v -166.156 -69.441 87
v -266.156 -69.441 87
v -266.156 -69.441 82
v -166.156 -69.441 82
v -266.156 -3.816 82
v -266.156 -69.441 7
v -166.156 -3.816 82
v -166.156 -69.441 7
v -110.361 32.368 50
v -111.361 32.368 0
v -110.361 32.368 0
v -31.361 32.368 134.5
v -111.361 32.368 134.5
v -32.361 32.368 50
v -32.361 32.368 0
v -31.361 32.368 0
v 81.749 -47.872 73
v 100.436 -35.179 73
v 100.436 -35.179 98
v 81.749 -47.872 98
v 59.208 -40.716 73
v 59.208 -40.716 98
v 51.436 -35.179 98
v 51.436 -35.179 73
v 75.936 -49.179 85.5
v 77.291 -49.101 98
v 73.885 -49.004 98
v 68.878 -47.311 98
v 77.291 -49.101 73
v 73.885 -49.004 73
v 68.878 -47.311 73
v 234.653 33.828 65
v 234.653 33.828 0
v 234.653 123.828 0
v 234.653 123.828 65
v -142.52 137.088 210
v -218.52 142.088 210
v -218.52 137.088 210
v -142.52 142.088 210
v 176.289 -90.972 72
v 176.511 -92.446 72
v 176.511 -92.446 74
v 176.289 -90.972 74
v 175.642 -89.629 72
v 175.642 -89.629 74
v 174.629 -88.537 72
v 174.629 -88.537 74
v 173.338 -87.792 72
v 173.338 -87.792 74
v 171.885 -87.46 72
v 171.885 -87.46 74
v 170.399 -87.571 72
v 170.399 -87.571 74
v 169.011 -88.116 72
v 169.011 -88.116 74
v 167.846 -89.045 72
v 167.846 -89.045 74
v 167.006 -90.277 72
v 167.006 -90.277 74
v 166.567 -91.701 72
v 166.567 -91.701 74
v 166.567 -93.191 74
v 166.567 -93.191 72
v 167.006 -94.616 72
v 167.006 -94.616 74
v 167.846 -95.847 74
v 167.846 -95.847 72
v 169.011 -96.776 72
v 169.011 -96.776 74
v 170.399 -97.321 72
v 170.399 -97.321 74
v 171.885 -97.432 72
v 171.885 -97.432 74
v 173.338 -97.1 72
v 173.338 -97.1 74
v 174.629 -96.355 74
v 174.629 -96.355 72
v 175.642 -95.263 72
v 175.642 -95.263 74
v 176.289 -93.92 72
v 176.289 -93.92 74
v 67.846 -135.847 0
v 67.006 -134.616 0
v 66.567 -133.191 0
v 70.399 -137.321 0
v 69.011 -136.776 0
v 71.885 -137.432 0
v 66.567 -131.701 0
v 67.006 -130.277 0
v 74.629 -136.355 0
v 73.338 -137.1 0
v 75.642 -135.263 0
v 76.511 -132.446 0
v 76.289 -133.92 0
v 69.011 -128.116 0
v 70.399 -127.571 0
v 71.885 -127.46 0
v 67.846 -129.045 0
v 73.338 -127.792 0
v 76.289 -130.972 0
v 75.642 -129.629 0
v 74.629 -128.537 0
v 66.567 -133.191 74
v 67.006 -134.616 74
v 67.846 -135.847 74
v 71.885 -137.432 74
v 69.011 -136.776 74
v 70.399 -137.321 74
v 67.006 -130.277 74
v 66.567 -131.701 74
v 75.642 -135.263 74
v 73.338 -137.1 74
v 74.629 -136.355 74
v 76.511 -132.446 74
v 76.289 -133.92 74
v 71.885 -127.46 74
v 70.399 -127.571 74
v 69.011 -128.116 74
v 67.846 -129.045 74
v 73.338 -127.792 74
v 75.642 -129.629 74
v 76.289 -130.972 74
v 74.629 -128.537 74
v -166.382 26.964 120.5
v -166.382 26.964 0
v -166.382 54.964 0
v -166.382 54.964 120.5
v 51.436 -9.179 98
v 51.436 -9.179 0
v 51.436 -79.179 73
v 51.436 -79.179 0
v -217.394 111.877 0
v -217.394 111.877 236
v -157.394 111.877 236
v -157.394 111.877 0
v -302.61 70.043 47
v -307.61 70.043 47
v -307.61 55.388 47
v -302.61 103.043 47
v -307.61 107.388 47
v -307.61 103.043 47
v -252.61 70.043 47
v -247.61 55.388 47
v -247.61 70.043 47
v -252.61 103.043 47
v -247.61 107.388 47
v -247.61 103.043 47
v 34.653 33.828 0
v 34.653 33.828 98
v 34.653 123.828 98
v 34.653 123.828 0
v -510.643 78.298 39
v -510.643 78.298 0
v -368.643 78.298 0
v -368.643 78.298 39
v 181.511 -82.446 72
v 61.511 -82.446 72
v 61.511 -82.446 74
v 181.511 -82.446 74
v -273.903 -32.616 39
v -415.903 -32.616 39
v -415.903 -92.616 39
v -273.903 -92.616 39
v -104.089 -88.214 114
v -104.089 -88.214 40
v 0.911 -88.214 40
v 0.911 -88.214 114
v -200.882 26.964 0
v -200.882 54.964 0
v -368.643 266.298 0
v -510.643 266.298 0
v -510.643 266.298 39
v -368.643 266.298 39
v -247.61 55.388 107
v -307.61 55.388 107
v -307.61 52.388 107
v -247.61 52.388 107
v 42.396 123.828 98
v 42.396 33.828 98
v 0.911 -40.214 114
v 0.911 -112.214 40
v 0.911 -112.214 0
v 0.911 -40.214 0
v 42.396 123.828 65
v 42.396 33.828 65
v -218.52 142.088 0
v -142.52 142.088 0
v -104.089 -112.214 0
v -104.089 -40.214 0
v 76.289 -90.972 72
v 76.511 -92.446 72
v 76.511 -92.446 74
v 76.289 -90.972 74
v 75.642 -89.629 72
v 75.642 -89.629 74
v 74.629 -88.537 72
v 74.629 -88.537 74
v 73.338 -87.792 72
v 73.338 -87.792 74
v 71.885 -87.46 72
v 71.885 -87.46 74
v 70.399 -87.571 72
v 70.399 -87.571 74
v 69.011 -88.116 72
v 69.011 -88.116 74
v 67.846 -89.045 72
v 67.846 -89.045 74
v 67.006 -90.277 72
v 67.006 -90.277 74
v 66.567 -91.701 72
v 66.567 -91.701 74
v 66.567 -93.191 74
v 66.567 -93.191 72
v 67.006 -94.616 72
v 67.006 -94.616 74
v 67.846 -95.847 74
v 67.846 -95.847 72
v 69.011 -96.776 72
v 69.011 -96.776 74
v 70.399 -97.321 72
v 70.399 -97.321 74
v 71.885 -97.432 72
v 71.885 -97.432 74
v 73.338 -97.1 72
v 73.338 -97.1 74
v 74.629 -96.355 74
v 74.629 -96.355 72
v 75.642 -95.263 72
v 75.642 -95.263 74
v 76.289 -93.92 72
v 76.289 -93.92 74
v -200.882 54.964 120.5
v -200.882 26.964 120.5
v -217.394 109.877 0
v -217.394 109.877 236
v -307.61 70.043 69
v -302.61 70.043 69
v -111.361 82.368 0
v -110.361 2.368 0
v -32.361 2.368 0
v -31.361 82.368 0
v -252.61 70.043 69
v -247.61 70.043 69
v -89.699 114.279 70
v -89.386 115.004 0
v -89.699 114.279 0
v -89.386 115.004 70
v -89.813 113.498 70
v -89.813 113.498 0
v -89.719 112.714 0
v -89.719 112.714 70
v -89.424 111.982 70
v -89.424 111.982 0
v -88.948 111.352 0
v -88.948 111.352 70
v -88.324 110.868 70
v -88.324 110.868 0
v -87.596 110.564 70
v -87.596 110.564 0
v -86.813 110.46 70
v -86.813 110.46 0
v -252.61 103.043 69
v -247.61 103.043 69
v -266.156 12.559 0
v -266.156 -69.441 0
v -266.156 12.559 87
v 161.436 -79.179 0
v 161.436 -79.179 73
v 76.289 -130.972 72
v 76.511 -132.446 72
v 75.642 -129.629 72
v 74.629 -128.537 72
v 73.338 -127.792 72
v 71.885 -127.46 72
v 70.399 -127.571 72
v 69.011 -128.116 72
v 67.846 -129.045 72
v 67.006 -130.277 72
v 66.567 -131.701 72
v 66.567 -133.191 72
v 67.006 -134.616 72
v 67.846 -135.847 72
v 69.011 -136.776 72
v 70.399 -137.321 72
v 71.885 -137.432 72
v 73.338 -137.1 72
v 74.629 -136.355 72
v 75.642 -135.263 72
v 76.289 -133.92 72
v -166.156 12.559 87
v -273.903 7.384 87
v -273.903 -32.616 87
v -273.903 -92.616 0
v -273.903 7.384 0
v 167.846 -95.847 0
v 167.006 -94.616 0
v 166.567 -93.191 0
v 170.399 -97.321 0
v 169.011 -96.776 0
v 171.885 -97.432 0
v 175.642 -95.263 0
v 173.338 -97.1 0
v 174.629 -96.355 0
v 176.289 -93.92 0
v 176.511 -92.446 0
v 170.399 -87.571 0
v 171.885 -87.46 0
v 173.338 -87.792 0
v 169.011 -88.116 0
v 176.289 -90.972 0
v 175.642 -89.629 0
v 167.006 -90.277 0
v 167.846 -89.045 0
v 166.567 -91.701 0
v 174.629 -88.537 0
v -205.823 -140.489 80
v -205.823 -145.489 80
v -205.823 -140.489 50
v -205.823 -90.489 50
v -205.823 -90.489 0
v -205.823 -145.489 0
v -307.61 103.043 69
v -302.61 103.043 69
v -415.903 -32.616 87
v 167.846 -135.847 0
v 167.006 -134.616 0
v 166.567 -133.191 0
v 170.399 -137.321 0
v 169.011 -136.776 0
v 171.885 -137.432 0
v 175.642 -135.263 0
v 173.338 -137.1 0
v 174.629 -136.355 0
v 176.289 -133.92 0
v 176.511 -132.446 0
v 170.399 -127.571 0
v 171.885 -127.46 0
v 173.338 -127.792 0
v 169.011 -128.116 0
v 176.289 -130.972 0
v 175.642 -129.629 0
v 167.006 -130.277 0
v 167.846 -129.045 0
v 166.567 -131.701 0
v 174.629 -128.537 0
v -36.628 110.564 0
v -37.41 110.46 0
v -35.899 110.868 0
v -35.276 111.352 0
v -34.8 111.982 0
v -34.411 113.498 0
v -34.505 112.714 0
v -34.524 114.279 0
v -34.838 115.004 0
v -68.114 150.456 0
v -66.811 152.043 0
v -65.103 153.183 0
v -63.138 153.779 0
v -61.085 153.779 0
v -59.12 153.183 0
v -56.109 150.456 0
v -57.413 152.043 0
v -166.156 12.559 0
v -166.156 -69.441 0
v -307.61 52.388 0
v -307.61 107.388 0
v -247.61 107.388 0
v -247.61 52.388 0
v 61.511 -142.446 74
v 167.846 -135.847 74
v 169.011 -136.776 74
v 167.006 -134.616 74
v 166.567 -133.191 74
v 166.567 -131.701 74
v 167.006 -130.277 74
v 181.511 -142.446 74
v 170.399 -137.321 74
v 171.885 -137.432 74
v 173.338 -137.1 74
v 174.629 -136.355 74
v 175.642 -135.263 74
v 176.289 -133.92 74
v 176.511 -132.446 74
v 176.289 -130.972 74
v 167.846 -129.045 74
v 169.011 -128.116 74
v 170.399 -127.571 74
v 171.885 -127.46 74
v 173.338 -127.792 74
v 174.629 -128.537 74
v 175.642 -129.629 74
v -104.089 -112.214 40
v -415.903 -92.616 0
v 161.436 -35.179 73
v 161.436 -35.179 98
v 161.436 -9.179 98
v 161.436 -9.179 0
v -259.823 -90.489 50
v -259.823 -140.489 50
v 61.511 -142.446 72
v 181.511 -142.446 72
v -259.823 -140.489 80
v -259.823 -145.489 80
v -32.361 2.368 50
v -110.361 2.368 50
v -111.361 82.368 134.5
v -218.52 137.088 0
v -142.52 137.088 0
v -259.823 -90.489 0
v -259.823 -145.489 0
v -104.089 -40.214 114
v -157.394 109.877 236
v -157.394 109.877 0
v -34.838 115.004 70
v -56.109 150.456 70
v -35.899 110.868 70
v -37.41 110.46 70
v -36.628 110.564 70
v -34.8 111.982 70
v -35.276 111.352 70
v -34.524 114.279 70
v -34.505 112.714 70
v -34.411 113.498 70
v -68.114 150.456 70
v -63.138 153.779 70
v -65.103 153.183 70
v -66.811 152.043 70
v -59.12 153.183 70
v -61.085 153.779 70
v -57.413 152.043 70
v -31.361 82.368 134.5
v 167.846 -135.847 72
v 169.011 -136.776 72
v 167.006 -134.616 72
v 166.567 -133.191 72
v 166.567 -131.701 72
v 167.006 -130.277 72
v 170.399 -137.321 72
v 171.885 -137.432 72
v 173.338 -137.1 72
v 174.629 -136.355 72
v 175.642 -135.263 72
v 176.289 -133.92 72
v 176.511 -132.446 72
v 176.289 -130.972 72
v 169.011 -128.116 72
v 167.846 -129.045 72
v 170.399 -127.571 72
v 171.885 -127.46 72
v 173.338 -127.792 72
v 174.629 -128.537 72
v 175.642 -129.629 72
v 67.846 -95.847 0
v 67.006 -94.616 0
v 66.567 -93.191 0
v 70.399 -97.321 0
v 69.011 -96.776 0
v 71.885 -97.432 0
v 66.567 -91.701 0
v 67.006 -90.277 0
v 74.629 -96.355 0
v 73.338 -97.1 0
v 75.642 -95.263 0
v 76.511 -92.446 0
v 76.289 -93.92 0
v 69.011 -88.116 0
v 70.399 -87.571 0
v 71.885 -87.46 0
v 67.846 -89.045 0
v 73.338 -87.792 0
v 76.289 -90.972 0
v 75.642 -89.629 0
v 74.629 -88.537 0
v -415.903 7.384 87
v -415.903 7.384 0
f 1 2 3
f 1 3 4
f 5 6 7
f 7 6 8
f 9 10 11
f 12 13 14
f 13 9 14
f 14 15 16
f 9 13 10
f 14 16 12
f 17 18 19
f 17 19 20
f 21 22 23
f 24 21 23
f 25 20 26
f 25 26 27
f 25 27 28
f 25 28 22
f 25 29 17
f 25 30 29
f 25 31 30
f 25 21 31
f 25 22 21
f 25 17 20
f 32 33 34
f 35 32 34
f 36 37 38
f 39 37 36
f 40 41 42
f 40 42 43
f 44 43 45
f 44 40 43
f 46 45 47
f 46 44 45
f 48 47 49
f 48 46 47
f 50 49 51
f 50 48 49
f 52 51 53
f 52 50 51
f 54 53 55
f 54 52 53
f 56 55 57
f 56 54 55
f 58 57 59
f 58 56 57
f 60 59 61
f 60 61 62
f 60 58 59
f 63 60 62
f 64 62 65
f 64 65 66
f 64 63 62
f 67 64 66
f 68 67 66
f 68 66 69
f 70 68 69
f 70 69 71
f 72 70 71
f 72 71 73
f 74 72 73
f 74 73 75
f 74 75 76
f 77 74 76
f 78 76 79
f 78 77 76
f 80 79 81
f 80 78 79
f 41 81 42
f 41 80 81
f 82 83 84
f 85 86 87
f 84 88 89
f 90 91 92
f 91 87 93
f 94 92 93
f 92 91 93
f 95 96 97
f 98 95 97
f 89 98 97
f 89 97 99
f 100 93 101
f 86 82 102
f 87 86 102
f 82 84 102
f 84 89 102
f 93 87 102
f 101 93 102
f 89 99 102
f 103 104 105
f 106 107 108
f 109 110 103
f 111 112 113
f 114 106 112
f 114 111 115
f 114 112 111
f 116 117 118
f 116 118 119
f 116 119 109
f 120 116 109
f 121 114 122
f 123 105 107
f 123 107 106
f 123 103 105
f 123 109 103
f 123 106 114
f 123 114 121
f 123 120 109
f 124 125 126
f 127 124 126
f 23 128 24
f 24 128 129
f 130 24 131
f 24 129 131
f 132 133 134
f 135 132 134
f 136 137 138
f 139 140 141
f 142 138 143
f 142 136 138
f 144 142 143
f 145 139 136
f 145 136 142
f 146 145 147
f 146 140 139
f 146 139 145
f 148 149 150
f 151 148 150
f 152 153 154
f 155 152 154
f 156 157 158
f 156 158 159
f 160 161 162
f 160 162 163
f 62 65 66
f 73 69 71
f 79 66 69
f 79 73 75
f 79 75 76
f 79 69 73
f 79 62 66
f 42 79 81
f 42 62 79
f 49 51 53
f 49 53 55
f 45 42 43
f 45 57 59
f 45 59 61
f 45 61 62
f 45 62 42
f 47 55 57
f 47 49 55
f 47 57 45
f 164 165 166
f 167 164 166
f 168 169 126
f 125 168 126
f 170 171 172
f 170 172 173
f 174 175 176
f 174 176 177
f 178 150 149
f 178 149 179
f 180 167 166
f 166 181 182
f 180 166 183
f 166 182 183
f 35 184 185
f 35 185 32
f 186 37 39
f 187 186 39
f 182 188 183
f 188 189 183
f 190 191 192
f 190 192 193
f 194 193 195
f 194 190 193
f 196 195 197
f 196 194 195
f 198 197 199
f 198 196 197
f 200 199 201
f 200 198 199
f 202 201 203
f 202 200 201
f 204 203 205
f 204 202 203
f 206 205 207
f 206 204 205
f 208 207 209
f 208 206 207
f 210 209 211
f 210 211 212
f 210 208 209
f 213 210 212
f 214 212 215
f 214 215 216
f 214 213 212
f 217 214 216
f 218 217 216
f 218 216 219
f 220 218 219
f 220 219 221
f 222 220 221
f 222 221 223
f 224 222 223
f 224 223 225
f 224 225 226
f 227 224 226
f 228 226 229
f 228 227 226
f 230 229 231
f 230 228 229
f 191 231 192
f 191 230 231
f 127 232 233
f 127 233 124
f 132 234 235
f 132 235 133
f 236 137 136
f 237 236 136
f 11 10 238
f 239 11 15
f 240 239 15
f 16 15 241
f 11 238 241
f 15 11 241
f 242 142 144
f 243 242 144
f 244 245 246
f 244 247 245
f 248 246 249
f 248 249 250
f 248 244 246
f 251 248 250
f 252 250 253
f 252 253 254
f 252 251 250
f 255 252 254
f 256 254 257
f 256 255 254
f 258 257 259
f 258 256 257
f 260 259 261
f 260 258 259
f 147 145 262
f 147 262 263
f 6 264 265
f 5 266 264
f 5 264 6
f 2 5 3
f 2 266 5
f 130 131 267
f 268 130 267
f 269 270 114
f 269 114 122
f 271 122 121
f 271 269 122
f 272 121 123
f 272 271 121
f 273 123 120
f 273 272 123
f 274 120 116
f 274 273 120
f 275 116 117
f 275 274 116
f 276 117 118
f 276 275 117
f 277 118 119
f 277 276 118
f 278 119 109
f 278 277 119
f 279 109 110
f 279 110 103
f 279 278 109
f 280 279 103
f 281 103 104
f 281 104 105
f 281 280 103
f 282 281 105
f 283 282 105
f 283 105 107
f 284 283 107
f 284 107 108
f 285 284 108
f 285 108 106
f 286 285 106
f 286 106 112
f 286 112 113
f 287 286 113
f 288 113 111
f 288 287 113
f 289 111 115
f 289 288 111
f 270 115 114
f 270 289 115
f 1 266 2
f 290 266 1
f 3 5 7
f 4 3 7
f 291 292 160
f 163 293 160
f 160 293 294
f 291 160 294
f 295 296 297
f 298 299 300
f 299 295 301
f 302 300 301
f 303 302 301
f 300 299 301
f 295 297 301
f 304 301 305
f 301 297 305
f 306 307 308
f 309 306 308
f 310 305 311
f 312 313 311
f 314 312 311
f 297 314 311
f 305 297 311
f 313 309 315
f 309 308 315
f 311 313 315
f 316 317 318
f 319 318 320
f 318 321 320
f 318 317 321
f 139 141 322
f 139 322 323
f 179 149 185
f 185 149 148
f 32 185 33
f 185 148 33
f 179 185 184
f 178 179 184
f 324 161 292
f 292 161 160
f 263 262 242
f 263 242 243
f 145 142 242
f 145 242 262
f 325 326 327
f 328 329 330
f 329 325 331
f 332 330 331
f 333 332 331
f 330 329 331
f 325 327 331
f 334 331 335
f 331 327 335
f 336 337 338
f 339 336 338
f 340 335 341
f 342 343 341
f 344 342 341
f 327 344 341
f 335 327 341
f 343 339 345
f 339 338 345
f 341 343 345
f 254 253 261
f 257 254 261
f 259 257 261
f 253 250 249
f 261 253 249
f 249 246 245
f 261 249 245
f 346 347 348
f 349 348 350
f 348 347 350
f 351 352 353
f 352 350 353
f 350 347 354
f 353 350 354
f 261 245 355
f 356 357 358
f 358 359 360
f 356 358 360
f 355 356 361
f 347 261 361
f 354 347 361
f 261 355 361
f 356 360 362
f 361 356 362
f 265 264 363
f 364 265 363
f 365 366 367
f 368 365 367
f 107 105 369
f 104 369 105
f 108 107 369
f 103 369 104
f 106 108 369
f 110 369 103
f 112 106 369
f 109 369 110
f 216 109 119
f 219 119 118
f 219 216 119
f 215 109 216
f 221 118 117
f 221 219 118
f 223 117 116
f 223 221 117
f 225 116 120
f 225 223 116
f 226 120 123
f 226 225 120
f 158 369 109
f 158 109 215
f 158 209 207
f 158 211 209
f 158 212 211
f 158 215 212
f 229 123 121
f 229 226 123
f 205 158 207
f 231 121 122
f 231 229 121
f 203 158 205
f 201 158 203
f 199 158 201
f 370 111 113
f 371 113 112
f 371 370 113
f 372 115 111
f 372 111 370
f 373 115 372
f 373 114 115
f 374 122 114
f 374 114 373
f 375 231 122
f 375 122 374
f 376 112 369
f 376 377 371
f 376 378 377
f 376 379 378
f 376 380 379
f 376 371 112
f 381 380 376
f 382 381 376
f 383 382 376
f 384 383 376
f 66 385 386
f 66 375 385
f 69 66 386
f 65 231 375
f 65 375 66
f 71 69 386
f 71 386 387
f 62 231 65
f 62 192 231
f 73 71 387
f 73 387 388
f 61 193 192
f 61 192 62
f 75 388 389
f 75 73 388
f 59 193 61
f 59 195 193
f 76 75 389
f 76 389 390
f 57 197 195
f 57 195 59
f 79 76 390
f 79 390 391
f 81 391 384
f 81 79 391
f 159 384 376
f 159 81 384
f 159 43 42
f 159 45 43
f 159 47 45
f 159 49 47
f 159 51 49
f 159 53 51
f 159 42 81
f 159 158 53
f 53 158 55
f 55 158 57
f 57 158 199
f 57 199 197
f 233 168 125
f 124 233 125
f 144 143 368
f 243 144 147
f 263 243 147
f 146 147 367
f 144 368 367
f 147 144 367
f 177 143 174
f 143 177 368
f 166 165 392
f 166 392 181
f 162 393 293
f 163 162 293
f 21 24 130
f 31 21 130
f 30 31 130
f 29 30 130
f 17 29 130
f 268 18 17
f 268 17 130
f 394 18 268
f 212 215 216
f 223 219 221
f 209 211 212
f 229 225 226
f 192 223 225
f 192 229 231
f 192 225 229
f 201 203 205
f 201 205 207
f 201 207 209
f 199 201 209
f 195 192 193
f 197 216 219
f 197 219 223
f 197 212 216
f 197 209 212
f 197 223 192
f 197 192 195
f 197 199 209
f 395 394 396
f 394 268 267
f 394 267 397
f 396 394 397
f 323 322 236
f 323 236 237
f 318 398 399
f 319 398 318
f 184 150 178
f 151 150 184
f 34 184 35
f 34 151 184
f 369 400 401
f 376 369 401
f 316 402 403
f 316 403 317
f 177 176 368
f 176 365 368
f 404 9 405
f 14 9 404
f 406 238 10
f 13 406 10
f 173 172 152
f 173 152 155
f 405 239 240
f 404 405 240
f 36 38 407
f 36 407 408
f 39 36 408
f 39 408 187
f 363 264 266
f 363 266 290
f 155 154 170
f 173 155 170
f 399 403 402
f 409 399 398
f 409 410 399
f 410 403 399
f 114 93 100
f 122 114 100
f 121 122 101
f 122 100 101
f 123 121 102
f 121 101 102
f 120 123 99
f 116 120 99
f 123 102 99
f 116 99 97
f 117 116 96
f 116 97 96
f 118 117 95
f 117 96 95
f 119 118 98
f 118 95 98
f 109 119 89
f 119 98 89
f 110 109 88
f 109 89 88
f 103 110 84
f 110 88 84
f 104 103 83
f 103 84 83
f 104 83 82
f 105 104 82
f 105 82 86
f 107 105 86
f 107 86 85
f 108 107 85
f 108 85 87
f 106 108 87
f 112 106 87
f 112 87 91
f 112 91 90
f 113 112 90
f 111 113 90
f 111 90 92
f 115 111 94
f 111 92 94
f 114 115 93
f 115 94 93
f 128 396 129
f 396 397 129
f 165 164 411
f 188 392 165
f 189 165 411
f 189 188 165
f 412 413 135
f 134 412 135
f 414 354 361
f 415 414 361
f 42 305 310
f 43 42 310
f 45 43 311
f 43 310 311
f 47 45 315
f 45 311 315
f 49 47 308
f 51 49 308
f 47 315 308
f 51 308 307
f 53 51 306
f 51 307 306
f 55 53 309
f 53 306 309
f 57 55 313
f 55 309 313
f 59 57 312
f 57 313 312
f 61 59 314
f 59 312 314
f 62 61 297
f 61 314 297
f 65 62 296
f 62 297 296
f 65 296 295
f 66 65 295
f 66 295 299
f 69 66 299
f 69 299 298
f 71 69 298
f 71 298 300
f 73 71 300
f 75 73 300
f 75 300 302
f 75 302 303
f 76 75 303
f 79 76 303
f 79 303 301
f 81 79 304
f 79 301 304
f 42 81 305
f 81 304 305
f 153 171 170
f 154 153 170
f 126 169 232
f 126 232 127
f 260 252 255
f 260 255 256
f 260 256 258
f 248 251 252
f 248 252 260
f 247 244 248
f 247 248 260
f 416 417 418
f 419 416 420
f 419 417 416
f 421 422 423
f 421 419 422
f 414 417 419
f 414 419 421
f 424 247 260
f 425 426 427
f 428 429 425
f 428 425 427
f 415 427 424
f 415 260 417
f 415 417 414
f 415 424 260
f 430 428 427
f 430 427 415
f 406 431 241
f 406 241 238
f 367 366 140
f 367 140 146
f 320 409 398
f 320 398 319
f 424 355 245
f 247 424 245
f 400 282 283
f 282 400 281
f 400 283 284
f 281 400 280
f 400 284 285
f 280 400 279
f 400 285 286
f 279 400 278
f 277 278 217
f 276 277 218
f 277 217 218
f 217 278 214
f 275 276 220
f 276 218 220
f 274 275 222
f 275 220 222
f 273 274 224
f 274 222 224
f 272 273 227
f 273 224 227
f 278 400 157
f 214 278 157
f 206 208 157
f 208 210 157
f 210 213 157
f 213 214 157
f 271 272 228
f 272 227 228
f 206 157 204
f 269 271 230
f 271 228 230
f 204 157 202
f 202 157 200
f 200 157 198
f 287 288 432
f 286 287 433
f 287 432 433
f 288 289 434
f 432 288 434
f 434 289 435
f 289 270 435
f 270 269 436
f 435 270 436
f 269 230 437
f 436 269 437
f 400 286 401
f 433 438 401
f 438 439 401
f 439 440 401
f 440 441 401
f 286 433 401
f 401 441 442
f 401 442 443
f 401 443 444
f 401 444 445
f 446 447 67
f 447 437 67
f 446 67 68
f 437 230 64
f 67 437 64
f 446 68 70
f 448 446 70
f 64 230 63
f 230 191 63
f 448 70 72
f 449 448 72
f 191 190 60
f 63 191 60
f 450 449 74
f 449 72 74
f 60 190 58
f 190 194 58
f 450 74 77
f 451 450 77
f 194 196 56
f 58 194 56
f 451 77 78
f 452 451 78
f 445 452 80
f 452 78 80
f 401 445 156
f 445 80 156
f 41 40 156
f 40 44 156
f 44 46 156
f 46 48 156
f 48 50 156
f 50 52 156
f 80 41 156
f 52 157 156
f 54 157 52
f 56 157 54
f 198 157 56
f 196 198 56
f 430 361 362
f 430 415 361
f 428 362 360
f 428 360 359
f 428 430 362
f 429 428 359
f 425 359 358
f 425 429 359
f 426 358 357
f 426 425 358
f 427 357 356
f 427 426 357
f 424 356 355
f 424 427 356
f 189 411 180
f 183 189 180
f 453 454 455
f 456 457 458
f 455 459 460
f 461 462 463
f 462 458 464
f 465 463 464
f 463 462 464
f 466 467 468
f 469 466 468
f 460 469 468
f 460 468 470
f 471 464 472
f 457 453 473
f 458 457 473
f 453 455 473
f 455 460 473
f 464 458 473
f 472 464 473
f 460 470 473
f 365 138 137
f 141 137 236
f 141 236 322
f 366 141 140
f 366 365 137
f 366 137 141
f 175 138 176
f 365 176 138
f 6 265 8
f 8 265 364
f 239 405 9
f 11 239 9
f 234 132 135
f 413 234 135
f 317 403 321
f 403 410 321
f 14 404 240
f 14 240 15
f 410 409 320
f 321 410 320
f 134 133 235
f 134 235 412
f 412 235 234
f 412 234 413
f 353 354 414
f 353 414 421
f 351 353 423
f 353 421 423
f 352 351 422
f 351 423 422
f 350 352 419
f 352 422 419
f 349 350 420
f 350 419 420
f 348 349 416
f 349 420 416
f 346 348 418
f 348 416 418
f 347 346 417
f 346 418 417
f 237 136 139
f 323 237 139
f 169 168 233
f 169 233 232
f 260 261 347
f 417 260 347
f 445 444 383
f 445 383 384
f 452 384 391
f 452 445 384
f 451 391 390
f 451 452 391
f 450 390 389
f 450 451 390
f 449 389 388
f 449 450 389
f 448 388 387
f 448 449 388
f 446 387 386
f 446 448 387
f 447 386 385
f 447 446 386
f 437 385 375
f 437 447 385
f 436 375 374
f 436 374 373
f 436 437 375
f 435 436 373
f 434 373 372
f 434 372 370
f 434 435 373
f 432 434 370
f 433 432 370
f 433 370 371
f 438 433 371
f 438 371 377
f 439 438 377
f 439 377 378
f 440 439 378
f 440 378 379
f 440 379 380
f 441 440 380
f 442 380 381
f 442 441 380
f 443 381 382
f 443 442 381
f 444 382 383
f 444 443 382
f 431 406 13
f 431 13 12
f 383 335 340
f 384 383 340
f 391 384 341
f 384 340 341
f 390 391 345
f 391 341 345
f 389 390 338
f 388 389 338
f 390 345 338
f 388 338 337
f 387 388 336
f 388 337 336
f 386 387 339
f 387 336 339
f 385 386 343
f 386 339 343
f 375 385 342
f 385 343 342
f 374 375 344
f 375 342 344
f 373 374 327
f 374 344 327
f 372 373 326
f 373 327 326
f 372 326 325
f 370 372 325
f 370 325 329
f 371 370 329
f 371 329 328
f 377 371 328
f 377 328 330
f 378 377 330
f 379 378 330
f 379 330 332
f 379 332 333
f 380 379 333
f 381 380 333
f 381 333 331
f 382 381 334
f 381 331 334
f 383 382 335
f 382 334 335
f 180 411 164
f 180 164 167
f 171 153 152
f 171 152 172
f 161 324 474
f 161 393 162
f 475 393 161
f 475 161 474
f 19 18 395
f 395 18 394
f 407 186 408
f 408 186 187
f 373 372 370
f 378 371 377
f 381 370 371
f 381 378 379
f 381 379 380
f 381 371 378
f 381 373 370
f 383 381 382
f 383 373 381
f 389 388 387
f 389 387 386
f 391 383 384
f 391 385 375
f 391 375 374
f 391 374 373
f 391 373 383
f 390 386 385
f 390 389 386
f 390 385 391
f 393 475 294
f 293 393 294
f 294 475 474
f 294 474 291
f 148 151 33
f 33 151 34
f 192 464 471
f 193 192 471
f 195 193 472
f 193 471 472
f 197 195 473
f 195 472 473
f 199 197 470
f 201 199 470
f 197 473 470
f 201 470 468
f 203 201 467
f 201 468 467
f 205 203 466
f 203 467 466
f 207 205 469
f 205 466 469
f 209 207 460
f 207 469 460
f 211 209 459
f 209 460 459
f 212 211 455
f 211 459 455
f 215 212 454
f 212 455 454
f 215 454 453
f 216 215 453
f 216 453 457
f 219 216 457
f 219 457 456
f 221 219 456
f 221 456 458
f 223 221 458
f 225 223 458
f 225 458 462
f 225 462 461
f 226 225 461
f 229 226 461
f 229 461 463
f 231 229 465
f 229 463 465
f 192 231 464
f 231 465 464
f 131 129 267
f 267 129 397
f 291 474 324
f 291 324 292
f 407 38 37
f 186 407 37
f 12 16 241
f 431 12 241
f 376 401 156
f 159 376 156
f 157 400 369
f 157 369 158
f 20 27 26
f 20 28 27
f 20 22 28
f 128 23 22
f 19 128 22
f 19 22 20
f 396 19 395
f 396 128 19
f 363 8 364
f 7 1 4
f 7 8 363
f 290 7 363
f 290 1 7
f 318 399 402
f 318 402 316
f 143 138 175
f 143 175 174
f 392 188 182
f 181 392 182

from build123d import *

# Parameters (mm, degrees)
F1_DEPTH  = 134.5
F0_W      = 78
F0_H      = 30
F2_DEPTH  = 50
F0_W_2    = 192.2561641597
F0_H_2    = 90
F3_DEPTH  = 65
F0_W_3    = 7.7438358403
F4_DEPTH  = 98
F0_W_4    = 110
F0_H_3    = 70
F5_DEPTH  = 73
F0_W_5    = 105
F0_H_4    = 48
F6_DEPTH  = 114
F8_DEPTH  = 25
F0_R      = 5
F9_DEPTH  = 74
F10_START = 72
F0_W_6    = 120
F0_H_5    = 60
F10_DEPTH = 2
F0_W_7    = 34.5
F0_H_6    = 28
F11_DEPTH = 120.5
F0_W_8    = 100
F0_H_7    = 82
F12_DEPTH = 87
F0_W_9    = 76
F0_H_8    = 5
F13_DEPTH = 210
F0_W_10   = 60
F0_H_9    = 2
F14_DEPTH = 236
F0_H_10   = 24
F15_DEPTH = 40
F16_SIZE2 = 80
F16_SIZE  = 70
F17_W     = 100
F17_H     = 70
F17_H_2   = 12
F18_DEPTH = 5
F0_H_11   = 55
F19_DEPTH = 47
F0_W_11   = 54
F20_DEPTH = 50
F21_W     = 5
F21_H     = 33
F22_DEPTH = 22
F21_W_2   = 60
F21_H_2   = 3
F23_DEPTH = 60
F24_W     = 54
F24_H     = 5
F25_DEPTH = 30
F26_DEPTH = 70
F27_R     = 3
F28_R     = 7
F0_W_12   = 142
F29_DEPTH = 39
F0_H_12   = 188
F0_H_13   = 40
F30_DEPTH = 87


with BuildPart() as f1:
    # F0 (on Top) → F1 (new body)
    with BuildSketch(Plane.XY):
        Polygon((-31.3613304122, 82.3684212938), (-111.3613304122, 82.3684212938), (-111.3613304122, 32.3684212938), (-110.3613304122, 32.3684212938), (-32.3613304122, 32.3684212938), (-31.3613304122, 32.3684212938), align=None)
    extrude(amount=F1_DEPTH)

    # F0 (on Top) → F2 (join)
    with BuildSketch(Plane.XY):
        with Locations((-71.3613304122, 17.3684212938)):
            Rectangle(F0_W, F0_H)
    extrude(amount=F2_DEPTH)


with BuildPart() as f3:
    # F0 (on Top) → F3 (new body)
    with BuildSketch(Plane.XY):
        with Locations((138.5245678854, 78.8277519985)):
            Rectangle(F0_W_2, F0_H_2)
    extrude(amount=F3_DEPTH)

    # F0 (on Top) → F4 (join)
    with BuildSketch(Plane.XY):
        with Locations((38.5245678854, 78.8277519985)):
            Rectangle(F0_W_3, F0_H_2)
    extrude(amount=F4_DEPTH)


with BuildPart() as f5:
    # F0 (on Top) → F5 (new body)
    with BuildSketch(Plane.XY):
        with Locations((106.4358714005, -44.1792364303)):
            Rectangle(F0_W_4, F0_H_3)
    extrude(amount=F5_DEPTH)

    # F7 (on face) → F8 (join)
    with BuildSketch(Plane.XY.offset(73)):
        with BuildLine():
            Line((100.4358714005, -35.1792364303), (161.4358714005, -35.1792364303))
            Line((161.4358714005, -35.1792364303), (161.4358714005, -9.1792364303))
            Line((161.4358714005, -9.1792364303), (51.4358714005, -9.1792364303))
            Line((51.4358714005, -9.1792364303), (51.4358714005, -35.1792364303))
            add(Edge.make_bspline(
                [(100.4358714005, -35.1792364303), (94.5814052077, -37.7631840456), (75.9888004838, -60.5908300163), (57.1844794266, -37.7721016431), (51.4358714005, -35.1792364303)],
                knots=[0, 0, 0, 0, 0.5, 1, 1, 1, 1], degree=3))
        make_face()
    extrude(amount=F8_DEPTH)


with BuildPart() as f6:
    # F0 (on Top) → F6 (new body)
    with BuildSketch(Plane.XY):
        with Locations((-51.5886056993, -64.2142896056)):
            Rectangle(F0_W_5, F0_H_4)
    extrude(amount=F6_DEPTH)

    # F0 (on Top) → F15 (join)
    with BuildSketch(Plane.XY):
        with Locations((-51.5886056993, -100.2142896056)):
            Rectangle(F0_W_5, F0_H_10)
    extrude(amount=F15_DEPTH)


with BuildPart() as f9:
    # F0 (on Top) → F9 (new body)
    with BuildSketch(Plane.XY):
        with Locations((71.5112297237, -92.4460858107)):
            Circle(F0_R)
    extrude(amount=F9_DEPTH)


with BuildPart() as f9b:
    # F0 (on Top) → F9, piece 2 (new body)
    with BuildSketch(Plane.XY):
        with Locations((171.5112297237, -92.4460858107)):
            Circle(F0_R)
    extrude(amount=F9_DEPTH)


with BuildPart() as f9c:
    # F0 (on Top) → F9, piece 3 (new body)
    with BuildSketch(Plane.XY):
        with Locations((171.5112297237, -132.4460858107)):
            Circle(F0_R)
    extrude(amount=F9_DEPTH)


with BuildPart() as f9d:
    # F0 (on Top) → F9, piece 4 (new body)
    with BuildSketch(Plane.XY):
        with Locations((71.5112297237, -132.4460858107)):
            Circle(F0_R)
    extrude(amount=F9_DEPTH)


with BuildPart() as f10:
    # F0 (on Top) → F10 (new body)
    with BuildSketch(Plane.XY.offset(F10_START)):
        with Locations((121.5112297237, -112.4460858107)):
            Rectangle(F0_W_6, F0_H_5)
        with Locations((71.5112297237, -132.4460858107)):
            Circle(F0_R, mode=Mode.SUBTRACT)
        with Locations((171.5112297237, -132.4460858107)):
            Circle(F0_R, mode=Mode.SUBTRACT)
        with Locations((71.5112297237, -92.4460858107)):
            Circle(F0_R, mode=Mode.SUBTRACT)
        with Locations((171.5112297237, -92.4460858107)):
            Circle(F0_R, mode=Mode.SUBTRACT)
    extrude(amount=F10_DEPTH)


with BuildPart() as f11:
    # F0 (on Top) → F11 (new body)
    with BuildSketch(Plane.XY):
        with Locations((-183.6317344904, 40.964334771)):
            Rectangle(F0_W_7, F0_H_6)
    extrude(amount=F11_DEPTH)


with BuildPart() as f12:
    # F0 (on Top) → F12 (new body)
    with BuildSketch(Plane.XY):
        with Locations((-216.1561071873, -28.4413781166)):
            Rectangle(F0_W_8, F0_H_7)
    extrude(amount=F12_DEPTH)

    # F16
    f16_edges = [f12.edges().sort_by_distance(p)[0] for p in [
        (-216.156107, -69.441378, 87),
    ]]
    f16_side = f12.faces().sort_by_distance((-216.156107, -28.441378, 87))[0]
    chamfer(f16_edges, length=F16_SIZE, length2=F16_SIZE2, reference=f16_side)

    # F17 (on face) → F18 (join)
    with BuildSketch(Plane.XY.offset(87)):
        with Locations((-216.1561071873, -34.4413781166)):
            Rectangle(F17_W, F17_H)
        with Locations((-216.1561071873, 6.5586218834)):
            Rectangle(F17_W, F17_H_2)
    extrude(amount=-F18_DEPTH)


with BuildPart() as f13:
    # F0 (on Top) → F13 (new body)
    with BuildSketch(Plane.XY):
        with Locations((-180.520373106, 139.5884776115)):
            Rectangle(F0_W_9, F0_H_8)
    extrude(amount=F13_DEPTH)


with BuildPart() as f14:
    # F0 (on Top) → F14 (new body)
    with BuildSketch(Plane.XY):
        with Locations((-187.3942774534, 110.8770946264)):
            Rectangle(F0_W_10, F0_H_9)
    extrude(amount=F14_DEPTH)


with BuildPart() as f19:
    # F0 (on Top) → F19 (new body)
    with BuildSketch(Plane.XY):
        with Locations((-277.6103627682, 79.8876026273)):
            Rectangle(F0_W_10, F0_H_11)
    extrude(amount=F19_DEPTH)

    # F21 (on face) → F22 (join)
    with BuildSketch(Plane.XY.offset(47)):
        with Locations((-305.1103627682, 86.5426399708)):
            Rectangle(F21_W, F21_H)
        with Locations((-250.1103627682, 86.5426399708)):
            Rectangle(F21_W, F21_H)
    extrude(amount=F22_DEPTH)

    # F21 (on face) → F23 (join)
    with BuildSketch(Plane.XY.offset(47)):
        with Locations((-277.6103627682, 53.8876026273)):
            Rectangle(F21_W_2, F21_H_2)
    extrude(amount=F23_DEPTH)


with BuildPart() as f20:
    # F0 (on Top) → F20 (new body)
    with BuildSketch(Plane.XY):
        with Locations((-232.8226964474, -117.9886496067)):
            Rectangle(F0_W_11, F0_H_11)
    extrude(amount=F20_DEPTH)

    # F24 (on face) → F25 (join)
    with BuildSketch(Plane.XY.offset(50)):
        with Locations((-232.8226964474, -142.9886496067)):
            Rectangle(F24_W, F24_H)
    extrude(amount=F25_DEPTH)


with BuildPart() as f26:
    # F0 (on Top) → F26 (new body)
    with BuildSketch(Plane.XY):
        Polygon((-32.111736536, 110.4601025581), (-62.111736536, 160.4601025581), (-92.111736536, 110.4601025581), align=None)
    extrude(amount=F26_DEPTH)

    # F27
    f27_edges = [f26.edges().sort_by_distance(p)[0] for p in [
        (-92.111737, 110.460103, 35),
        (-32.111737, 110.460103, 35),
    ]]
    fillet(f27_edges, radius=F27_R)

    # F28
    f28_edges = [f26.edges().sort_by_distance(p)[0] for p in [
        (-62.111737, 160.460103, 35),
    ]]
    fillet(f28_edges, radius=F28_R)


with BuildPart() as f29:
    # F0 (on Top) → F29 (new body)
    with BuildSketch(Plane.XY):
        with Locations((-344.9034192562, -62.6164388657)):
            Rectangle(F0_W_12, F0_H_5)
    extrude(amount=F29_DEPTH)

    # F0 (on Top) → F30 (join)
    with BuildSketch(Plane.XY):
        with Locations((-344.9034192562, -12.6164388657)):
            Rectangle(F0_W_12, F0_H_13)
    extrude(amount=F30_DEPTH)


with BuildPart() as f29b:
    # F0 (on Top) → F29, piece 2 (new body)
    with BuildSketch(Plane.XY):
        with Locations((-439.6425881386, 172.2982185483)):
            Rectangle(F0_W_12, F0_H_12)
    extrude(amount=F29_DEPTH)


solid = Compound([f1.part, f3.part, f5.part, f6.part, f9.part, f9b.part, f9c.part, f9d.part, f10.part, f11.part, f12.part, f13.part, f14.part, f19.part, f20.part, f26.part, f29.part, f29b.part])
